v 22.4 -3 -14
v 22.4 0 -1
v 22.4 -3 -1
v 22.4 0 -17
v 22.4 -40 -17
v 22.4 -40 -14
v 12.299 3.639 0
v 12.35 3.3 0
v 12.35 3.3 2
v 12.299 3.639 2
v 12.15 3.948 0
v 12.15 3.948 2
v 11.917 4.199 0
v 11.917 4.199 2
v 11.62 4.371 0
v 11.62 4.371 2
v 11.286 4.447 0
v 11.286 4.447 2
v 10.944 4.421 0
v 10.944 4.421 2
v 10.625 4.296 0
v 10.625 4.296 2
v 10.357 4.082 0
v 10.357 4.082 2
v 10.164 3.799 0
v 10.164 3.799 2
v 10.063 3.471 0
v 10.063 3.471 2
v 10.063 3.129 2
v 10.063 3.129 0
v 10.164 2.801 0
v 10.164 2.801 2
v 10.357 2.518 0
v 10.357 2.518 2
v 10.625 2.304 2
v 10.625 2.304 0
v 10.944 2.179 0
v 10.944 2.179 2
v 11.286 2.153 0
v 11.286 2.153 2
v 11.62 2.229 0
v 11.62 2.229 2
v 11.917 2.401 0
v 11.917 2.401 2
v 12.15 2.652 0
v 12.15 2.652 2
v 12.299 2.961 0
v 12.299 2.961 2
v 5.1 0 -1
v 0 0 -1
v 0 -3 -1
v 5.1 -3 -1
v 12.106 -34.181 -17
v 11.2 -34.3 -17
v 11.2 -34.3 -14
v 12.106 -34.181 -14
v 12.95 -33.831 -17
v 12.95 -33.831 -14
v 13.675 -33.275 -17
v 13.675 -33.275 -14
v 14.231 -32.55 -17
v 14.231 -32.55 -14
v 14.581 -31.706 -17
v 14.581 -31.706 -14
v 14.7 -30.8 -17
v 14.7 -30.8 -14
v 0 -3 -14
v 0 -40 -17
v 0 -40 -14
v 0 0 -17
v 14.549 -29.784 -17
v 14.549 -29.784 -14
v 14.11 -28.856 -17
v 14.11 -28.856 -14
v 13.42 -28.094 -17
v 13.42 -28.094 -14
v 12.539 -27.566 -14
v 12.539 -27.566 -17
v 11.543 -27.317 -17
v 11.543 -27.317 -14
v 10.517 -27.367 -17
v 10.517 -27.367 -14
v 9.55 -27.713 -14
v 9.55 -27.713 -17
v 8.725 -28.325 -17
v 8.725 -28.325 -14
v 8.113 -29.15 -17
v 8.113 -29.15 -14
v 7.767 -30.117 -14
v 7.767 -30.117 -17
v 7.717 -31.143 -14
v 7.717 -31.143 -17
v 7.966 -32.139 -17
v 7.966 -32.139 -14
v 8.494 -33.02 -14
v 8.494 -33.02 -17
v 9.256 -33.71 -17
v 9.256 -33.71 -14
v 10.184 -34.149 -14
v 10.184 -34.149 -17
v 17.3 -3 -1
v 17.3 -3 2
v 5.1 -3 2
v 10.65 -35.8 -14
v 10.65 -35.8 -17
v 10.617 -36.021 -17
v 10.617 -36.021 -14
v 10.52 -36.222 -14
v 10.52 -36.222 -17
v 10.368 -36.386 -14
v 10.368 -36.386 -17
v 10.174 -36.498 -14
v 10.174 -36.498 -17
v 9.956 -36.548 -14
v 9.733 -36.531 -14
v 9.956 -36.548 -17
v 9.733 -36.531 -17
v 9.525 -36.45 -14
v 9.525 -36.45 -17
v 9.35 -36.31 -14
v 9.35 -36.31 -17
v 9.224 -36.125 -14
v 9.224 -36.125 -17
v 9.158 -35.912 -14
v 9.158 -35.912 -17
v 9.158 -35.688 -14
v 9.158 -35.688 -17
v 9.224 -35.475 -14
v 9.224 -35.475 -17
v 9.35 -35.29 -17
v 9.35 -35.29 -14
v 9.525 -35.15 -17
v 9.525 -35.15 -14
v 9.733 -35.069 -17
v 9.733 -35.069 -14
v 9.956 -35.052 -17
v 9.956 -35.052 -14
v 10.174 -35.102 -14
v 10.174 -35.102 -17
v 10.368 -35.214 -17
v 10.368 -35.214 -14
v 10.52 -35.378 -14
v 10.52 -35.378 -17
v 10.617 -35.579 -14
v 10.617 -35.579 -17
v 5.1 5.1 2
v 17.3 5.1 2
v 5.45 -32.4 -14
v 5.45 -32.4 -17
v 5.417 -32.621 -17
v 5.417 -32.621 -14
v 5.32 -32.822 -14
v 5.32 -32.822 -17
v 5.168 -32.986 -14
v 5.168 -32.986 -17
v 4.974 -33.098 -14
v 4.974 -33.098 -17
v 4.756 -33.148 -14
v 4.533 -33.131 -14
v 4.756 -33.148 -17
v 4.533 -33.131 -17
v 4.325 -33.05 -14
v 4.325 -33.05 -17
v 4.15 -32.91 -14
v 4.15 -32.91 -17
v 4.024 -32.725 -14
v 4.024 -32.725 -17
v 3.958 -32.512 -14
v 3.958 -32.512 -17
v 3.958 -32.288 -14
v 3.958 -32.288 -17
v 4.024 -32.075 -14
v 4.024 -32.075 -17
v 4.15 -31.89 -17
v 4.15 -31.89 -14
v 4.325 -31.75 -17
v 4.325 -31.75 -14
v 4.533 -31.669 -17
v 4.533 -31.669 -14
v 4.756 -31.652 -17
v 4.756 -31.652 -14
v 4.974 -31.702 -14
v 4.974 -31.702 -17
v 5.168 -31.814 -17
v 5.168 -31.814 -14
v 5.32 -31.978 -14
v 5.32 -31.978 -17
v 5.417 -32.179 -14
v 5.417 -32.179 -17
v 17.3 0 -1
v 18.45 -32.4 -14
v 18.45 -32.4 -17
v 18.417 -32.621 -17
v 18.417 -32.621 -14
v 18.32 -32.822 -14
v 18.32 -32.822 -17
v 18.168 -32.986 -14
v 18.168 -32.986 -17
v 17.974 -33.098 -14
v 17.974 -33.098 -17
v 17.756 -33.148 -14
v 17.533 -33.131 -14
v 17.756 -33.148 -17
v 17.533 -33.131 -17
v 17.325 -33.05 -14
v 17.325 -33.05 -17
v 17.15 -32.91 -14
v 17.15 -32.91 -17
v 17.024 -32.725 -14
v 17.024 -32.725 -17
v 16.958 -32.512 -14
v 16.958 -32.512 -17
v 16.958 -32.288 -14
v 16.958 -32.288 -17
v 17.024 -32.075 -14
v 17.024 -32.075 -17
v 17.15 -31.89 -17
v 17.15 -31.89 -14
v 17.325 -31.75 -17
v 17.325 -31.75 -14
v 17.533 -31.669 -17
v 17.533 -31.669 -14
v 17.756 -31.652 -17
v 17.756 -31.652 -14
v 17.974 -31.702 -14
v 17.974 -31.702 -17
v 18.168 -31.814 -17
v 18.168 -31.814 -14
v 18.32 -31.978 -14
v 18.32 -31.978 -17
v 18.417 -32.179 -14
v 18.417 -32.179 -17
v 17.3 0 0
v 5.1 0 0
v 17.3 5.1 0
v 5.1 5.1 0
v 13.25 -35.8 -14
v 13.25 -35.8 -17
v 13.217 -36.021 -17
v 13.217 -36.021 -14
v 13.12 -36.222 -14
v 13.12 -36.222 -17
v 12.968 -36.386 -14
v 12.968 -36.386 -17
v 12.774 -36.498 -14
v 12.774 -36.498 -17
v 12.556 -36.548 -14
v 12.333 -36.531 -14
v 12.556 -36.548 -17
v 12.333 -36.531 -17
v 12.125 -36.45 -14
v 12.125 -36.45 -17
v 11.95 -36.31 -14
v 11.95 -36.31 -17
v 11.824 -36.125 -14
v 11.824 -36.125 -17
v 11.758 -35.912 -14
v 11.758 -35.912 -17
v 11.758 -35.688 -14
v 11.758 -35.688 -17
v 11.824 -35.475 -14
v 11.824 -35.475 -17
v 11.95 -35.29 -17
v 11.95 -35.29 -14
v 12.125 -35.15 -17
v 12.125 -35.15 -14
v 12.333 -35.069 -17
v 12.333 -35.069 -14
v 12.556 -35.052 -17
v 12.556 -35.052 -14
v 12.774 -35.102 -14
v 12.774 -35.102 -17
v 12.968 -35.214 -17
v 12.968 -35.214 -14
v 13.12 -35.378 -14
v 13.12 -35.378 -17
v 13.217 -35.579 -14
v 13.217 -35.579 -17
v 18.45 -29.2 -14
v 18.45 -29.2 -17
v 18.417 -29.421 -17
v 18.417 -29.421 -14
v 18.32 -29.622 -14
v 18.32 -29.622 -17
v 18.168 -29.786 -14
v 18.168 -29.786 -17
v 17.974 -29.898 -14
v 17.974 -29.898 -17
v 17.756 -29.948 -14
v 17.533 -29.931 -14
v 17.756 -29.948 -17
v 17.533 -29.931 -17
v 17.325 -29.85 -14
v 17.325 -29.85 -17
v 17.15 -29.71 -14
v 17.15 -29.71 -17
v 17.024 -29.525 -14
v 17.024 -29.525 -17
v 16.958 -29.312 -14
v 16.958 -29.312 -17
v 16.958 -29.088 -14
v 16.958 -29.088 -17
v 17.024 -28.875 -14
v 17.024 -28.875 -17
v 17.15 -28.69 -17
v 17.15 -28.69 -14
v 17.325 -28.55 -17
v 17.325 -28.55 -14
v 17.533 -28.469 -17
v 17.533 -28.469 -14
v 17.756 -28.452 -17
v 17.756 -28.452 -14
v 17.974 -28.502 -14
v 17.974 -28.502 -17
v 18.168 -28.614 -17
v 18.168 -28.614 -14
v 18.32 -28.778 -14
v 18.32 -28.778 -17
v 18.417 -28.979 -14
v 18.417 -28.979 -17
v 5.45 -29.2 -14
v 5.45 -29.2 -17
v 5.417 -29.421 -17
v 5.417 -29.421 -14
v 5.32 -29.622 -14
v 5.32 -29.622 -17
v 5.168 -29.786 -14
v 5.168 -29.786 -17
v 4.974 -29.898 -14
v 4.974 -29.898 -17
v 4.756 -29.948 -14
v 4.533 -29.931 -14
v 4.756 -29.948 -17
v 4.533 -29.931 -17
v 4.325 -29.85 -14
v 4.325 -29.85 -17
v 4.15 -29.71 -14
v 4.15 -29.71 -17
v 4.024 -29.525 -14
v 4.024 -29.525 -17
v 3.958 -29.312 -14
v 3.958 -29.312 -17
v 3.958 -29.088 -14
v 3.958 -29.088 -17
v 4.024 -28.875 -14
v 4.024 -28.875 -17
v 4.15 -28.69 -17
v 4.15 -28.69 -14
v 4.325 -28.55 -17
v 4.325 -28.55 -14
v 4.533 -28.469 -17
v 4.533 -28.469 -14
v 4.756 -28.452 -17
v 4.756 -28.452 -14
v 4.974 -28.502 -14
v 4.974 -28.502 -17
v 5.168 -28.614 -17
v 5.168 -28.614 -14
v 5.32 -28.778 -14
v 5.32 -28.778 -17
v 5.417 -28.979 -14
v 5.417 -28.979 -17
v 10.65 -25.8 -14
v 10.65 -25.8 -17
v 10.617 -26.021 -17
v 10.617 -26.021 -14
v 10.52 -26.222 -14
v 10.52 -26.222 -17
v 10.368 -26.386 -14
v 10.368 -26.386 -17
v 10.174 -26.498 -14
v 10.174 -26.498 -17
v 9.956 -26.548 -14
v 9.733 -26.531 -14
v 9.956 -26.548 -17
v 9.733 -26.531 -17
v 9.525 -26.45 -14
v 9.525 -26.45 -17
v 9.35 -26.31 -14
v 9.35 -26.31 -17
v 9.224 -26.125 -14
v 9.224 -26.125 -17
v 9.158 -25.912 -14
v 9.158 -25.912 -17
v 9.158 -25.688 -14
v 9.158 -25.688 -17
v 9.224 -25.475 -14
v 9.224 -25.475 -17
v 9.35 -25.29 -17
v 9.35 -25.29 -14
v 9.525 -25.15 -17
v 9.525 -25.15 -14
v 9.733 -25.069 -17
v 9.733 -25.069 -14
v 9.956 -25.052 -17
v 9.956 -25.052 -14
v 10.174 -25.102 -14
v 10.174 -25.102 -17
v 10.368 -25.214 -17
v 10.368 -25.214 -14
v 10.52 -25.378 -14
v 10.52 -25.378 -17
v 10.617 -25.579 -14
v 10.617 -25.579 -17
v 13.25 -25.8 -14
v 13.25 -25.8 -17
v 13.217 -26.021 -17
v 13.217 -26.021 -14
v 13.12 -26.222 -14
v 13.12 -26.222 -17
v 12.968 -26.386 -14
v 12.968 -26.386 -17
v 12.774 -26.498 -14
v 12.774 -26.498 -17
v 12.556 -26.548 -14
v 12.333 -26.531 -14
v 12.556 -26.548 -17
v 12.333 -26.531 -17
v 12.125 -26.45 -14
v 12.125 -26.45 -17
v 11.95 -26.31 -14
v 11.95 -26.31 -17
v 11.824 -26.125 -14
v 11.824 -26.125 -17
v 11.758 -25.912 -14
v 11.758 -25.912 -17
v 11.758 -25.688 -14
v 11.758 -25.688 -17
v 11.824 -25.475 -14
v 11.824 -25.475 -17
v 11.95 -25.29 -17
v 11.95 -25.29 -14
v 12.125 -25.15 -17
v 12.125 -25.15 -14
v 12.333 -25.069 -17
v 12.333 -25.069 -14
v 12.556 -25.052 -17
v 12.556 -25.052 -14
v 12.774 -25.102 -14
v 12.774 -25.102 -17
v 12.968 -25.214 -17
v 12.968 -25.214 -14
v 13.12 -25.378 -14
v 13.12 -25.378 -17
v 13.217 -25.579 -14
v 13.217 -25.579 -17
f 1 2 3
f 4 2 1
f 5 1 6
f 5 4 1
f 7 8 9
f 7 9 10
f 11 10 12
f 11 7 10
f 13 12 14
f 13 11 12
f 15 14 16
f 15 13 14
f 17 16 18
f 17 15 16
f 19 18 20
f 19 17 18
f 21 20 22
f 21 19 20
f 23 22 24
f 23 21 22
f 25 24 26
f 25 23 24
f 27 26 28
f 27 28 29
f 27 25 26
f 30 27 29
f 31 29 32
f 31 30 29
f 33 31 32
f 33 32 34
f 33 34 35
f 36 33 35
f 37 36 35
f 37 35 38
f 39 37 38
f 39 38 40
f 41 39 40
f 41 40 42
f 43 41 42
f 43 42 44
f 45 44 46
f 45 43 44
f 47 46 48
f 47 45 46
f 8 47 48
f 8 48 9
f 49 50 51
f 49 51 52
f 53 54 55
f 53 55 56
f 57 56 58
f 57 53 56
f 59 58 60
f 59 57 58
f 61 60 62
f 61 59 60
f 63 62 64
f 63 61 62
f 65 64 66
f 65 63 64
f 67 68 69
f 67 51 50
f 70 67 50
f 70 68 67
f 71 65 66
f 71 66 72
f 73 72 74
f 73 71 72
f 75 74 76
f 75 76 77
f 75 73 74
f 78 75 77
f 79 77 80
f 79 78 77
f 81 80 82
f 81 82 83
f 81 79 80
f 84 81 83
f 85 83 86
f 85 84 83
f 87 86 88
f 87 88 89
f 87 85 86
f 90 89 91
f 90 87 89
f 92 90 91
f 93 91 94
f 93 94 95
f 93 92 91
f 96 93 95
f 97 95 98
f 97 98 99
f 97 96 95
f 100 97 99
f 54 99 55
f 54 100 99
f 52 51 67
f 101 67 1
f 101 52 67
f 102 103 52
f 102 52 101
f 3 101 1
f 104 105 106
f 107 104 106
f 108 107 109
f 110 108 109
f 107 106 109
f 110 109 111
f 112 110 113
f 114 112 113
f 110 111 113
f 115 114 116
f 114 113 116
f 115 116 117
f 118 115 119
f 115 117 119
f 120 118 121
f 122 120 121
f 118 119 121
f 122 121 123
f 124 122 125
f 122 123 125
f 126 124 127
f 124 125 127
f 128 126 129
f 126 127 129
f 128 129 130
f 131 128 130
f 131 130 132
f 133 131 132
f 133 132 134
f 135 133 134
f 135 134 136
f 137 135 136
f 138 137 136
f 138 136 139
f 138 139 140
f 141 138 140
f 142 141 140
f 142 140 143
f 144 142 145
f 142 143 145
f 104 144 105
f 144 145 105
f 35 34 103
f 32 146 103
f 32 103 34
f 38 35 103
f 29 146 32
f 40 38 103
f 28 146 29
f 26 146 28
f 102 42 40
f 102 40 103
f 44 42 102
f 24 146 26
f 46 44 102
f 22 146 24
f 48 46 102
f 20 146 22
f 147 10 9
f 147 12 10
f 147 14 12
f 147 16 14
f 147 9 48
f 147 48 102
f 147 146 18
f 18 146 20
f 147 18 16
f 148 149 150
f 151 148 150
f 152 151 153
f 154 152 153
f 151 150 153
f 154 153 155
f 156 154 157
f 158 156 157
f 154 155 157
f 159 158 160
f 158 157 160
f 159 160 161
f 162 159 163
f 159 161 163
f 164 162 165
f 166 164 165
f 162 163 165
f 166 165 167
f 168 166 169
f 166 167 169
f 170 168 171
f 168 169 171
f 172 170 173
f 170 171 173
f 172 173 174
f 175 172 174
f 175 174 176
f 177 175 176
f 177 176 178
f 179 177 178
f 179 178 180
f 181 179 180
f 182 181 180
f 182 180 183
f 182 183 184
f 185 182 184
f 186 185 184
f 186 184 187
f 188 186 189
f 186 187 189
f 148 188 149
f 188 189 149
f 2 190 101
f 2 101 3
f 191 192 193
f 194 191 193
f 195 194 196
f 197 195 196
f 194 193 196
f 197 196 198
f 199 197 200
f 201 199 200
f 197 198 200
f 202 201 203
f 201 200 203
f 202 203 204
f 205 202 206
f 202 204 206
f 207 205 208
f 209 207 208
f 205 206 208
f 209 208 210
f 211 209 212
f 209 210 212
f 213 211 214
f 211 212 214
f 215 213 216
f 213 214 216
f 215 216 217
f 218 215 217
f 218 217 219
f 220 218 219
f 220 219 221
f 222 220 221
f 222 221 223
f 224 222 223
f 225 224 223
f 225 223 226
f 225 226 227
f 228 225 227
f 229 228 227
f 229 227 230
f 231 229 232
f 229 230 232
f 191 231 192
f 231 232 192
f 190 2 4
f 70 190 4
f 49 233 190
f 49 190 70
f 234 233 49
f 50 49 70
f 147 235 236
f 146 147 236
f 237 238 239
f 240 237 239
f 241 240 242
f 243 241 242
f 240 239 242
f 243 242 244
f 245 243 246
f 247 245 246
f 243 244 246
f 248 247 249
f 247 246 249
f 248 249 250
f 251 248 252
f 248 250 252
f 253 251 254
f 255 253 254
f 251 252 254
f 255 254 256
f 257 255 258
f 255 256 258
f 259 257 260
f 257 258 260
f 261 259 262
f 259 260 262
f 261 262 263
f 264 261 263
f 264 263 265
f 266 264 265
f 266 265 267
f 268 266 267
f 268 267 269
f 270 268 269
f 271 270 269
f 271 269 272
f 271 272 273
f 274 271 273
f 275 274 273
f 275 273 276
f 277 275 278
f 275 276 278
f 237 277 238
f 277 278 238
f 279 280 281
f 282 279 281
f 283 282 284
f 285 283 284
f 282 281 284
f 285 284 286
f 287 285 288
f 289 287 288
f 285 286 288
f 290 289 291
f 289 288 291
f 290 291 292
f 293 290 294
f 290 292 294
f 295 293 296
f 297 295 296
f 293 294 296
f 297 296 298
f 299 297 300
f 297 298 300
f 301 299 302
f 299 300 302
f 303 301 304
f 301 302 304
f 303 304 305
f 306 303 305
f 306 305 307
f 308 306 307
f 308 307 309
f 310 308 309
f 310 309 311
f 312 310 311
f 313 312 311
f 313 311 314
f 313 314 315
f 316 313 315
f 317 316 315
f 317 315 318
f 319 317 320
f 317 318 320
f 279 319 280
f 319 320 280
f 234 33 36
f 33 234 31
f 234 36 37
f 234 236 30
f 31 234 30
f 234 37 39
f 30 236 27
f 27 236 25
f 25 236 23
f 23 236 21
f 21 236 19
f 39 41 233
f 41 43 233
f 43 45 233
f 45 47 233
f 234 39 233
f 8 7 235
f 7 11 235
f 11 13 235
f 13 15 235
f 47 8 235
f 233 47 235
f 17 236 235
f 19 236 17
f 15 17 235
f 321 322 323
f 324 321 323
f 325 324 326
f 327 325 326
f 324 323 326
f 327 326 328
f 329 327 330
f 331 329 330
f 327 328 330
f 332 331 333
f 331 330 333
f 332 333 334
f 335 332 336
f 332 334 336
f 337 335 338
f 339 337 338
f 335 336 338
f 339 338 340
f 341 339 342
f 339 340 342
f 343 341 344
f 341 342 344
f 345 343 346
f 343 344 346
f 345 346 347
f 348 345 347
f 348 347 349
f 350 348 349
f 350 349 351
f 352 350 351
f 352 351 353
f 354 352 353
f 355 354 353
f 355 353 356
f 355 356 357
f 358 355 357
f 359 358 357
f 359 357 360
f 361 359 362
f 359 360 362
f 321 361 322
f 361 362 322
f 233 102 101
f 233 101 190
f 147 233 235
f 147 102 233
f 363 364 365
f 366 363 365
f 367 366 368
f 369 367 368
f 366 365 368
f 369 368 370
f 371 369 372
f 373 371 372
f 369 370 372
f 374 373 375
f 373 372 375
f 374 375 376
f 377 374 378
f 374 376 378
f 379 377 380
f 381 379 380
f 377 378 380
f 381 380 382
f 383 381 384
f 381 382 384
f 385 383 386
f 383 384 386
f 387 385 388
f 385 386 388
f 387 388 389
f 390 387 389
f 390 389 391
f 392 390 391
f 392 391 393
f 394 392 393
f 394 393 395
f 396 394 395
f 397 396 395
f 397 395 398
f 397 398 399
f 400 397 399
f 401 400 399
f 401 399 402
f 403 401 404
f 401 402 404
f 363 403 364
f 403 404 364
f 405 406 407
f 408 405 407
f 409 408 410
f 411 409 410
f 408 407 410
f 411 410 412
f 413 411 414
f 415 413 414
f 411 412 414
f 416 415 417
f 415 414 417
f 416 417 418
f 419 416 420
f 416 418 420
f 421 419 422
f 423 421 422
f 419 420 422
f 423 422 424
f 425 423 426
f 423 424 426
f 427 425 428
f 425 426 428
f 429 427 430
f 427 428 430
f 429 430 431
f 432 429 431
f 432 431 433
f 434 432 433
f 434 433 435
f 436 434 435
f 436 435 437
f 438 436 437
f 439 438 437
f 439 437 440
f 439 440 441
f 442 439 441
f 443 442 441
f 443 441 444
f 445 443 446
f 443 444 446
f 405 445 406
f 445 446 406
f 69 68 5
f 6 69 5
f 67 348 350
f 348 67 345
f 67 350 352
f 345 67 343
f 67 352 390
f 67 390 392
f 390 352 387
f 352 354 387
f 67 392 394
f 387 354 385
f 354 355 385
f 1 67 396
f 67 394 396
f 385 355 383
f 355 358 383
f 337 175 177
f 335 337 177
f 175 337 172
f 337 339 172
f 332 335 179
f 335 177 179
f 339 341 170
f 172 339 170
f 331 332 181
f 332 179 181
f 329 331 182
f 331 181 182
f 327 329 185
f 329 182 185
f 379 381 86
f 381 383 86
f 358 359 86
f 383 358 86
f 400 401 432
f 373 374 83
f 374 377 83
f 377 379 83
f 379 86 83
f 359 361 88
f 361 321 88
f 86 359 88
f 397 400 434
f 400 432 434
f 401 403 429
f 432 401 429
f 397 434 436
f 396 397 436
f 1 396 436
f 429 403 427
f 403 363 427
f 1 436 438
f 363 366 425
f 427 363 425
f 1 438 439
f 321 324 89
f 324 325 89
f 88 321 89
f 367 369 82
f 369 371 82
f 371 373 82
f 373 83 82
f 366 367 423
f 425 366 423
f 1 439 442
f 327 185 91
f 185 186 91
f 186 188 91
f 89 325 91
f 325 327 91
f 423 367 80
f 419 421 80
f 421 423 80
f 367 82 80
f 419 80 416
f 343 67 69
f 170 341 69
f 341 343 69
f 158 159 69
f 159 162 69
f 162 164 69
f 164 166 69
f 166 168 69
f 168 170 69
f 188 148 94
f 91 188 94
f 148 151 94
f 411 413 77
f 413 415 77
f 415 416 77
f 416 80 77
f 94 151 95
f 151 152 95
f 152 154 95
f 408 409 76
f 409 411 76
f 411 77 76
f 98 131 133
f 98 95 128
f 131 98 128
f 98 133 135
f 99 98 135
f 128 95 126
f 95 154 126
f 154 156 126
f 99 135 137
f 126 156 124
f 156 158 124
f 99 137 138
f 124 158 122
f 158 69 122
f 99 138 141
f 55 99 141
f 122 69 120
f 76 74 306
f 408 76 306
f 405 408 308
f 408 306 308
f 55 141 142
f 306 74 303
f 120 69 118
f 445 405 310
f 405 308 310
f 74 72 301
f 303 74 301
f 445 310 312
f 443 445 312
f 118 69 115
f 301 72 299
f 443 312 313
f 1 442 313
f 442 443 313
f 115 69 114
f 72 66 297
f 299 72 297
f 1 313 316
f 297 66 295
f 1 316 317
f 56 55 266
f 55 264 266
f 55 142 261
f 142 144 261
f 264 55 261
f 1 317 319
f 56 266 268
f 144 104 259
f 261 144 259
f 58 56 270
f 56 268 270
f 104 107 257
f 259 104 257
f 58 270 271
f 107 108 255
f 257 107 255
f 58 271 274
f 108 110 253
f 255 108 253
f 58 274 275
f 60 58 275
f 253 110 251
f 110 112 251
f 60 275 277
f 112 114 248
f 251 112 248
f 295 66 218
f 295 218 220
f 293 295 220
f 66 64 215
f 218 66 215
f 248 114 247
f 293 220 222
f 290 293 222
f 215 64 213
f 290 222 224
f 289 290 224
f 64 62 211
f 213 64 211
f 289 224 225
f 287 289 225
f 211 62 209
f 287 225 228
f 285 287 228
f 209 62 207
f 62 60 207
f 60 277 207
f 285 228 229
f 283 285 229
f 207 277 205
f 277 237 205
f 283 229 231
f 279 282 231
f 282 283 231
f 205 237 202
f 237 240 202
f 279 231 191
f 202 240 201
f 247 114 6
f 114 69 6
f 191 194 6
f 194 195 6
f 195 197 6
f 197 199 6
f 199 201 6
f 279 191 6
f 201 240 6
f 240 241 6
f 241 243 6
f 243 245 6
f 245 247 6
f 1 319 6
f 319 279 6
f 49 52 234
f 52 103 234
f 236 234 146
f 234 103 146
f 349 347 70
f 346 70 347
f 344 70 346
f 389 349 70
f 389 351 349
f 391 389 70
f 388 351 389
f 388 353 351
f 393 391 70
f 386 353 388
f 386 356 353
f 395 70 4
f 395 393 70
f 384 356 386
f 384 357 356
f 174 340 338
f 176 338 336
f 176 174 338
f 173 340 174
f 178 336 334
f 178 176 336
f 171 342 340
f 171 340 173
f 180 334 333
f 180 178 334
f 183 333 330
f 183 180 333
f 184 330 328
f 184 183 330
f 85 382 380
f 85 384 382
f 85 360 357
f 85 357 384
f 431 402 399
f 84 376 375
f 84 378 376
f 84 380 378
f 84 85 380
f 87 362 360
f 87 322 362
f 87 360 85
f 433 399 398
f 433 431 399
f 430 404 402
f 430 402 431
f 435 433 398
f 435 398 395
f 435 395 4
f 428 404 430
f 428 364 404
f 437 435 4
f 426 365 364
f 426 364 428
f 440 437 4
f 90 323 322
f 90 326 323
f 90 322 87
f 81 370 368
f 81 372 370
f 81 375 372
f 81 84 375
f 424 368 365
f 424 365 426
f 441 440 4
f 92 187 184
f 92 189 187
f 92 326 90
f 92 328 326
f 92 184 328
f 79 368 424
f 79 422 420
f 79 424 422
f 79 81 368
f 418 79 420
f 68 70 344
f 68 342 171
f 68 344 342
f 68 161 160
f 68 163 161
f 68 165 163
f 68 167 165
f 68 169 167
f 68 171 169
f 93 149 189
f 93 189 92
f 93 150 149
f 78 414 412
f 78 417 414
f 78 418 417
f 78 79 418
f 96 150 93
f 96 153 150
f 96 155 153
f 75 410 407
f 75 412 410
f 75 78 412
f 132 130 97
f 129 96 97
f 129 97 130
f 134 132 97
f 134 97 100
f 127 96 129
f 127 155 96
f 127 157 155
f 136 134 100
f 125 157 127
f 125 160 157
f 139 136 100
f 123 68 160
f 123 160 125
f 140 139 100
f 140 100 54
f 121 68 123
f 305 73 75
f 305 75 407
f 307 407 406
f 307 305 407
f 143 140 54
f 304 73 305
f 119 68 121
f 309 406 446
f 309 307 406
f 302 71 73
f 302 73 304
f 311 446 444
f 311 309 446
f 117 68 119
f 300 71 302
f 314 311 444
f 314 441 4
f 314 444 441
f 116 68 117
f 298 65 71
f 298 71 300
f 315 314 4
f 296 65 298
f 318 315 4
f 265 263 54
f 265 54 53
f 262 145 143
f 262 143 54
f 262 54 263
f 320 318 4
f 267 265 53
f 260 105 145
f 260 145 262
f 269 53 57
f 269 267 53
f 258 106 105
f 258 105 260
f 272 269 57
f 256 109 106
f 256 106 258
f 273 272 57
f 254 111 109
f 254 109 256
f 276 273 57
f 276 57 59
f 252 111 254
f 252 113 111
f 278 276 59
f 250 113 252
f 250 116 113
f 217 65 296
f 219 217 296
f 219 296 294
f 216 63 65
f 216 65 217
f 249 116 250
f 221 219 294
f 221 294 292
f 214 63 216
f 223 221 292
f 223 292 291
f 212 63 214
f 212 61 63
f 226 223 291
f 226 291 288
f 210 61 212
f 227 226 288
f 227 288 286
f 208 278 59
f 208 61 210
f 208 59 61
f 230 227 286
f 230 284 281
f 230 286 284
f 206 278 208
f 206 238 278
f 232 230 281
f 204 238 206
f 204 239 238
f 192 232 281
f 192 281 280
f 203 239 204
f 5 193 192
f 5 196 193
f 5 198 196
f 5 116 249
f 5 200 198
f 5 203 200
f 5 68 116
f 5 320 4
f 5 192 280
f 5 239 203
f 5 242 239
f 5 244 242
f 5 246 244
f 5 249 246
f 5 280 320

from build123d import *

# Parameters (mm, degrees)
F0_R     = 1.15
F1_DEPTH = 2
F0_W     = 5.1
F0_H     = 3
F2_DEPTH = 17
F3_W     = 22.4
F3_H     = 37
F3_R     = 0.75
F3_H_2   = 3
F4_DEPTH = 3
F5_W     = 5.1
F5_H     = 3
F6_DEPTH = 1


with BuildPart() as f1:
    # F0 (on Top) → F1 (new body)
    with BuildSketch(Plane.XY):
        Polygon((5.1, 0), (11.2, 0), (17.3, 0), (17.3, 5.1), (11.2, 5.1), (5.1, 5.1), align=None)
        with Locations((11.2, 3.3)):
            Circle(F0_R, mode=Mode.SUBTRACT)
        Polygon((17.3, 0), (11.2, 0), (5.1, 0), (5.1, -3), (17.3, -3), align=None)
    extrude(amount=F1_DEPTH)

    # F0 (on Top) → F2 (join)
    with BuildSketch(Plane.XY):
        with Locations((2.55, -1.5)):
            Rectangle(F0_W, F0_H)
        Polygon((17.3, 0), (11.2, 0), (5.1, 0), (5.1, -3), (17.3, -3), align=None)
        with Locations((19.85, -1.5)):
            Rectangle(F0_W, F0_H)
    extrude(amount=-F2_DEPTH)

    # F3 (on face) → F4 (join)
    with BuildSketch(Plane(origin=(0, 0, -17), x_dir=(1, 0, 0), z_dir=(0, 0, -1))):
        with Locations((11.2, 21.5)):
            Rectangle(F3_W, F3_H)
        with Locations((4.6999996006, 29.2)):
            Circle(F3_R, mode=Mode.SUBTRACT)
        with Locations((9.8999996006, 25.8)):
            Circle(F3_R, mode=Mode.SUBTRACT)
        with Locations((4.6999996006, 32.4)):
            Circle(F3_R, mode=Mode.SUBTRACT)
        with BuildLine():
            ThreePointArc((11.1999996006, 34.3), (13.6748733348, 33.2748737342), (14.6999996006, 30.8))
            ThreePointArc((14.6999996006, 30.8), (8.7251258665, 28.3251262658), (11.1999996006, 34.3))
        make_face(mode=Mode.SUBTRACT)
        with Locations((9.8999996006, 35.8)):
            Circle(F3_R, mode=Mode.SUBTRACT)
        with Locations((12.4999996006, 25.8)):
            Circle(F3_R, mode=Mode.SUBTRACT)
        with Locations((17.6999996006, 29.2)):
            Circle(F3_R, mode=Mode.SUBTRACT)
        with Locations((12.4999996006, 35.8)):
            Circle(F3_R, mode=Mode.SUBTRACT)
        with Locations((17.6999996006, 32.4)):
            Circle(F3_R, mode=Mode.SUBTRACT)
        with Locations((11.2, 1.5)):
            Rectangle(F3_W, F3_H_2)
    extrude(amount=-F4_DEPTH)

    # F5 (on face) → F6 (cut)
    with BuildSketch(Plane.XY):
        with Locations((2.55, -1.5)):
            Rectangle(F5_W, F5_H)
        with Locations((19.85, -1.5)):
            Rectangle(F5_W, F5_H)
    extrude(amount=-F6_DEPTH, mode=Mode.SUBTRACT)


solid = f1.part
